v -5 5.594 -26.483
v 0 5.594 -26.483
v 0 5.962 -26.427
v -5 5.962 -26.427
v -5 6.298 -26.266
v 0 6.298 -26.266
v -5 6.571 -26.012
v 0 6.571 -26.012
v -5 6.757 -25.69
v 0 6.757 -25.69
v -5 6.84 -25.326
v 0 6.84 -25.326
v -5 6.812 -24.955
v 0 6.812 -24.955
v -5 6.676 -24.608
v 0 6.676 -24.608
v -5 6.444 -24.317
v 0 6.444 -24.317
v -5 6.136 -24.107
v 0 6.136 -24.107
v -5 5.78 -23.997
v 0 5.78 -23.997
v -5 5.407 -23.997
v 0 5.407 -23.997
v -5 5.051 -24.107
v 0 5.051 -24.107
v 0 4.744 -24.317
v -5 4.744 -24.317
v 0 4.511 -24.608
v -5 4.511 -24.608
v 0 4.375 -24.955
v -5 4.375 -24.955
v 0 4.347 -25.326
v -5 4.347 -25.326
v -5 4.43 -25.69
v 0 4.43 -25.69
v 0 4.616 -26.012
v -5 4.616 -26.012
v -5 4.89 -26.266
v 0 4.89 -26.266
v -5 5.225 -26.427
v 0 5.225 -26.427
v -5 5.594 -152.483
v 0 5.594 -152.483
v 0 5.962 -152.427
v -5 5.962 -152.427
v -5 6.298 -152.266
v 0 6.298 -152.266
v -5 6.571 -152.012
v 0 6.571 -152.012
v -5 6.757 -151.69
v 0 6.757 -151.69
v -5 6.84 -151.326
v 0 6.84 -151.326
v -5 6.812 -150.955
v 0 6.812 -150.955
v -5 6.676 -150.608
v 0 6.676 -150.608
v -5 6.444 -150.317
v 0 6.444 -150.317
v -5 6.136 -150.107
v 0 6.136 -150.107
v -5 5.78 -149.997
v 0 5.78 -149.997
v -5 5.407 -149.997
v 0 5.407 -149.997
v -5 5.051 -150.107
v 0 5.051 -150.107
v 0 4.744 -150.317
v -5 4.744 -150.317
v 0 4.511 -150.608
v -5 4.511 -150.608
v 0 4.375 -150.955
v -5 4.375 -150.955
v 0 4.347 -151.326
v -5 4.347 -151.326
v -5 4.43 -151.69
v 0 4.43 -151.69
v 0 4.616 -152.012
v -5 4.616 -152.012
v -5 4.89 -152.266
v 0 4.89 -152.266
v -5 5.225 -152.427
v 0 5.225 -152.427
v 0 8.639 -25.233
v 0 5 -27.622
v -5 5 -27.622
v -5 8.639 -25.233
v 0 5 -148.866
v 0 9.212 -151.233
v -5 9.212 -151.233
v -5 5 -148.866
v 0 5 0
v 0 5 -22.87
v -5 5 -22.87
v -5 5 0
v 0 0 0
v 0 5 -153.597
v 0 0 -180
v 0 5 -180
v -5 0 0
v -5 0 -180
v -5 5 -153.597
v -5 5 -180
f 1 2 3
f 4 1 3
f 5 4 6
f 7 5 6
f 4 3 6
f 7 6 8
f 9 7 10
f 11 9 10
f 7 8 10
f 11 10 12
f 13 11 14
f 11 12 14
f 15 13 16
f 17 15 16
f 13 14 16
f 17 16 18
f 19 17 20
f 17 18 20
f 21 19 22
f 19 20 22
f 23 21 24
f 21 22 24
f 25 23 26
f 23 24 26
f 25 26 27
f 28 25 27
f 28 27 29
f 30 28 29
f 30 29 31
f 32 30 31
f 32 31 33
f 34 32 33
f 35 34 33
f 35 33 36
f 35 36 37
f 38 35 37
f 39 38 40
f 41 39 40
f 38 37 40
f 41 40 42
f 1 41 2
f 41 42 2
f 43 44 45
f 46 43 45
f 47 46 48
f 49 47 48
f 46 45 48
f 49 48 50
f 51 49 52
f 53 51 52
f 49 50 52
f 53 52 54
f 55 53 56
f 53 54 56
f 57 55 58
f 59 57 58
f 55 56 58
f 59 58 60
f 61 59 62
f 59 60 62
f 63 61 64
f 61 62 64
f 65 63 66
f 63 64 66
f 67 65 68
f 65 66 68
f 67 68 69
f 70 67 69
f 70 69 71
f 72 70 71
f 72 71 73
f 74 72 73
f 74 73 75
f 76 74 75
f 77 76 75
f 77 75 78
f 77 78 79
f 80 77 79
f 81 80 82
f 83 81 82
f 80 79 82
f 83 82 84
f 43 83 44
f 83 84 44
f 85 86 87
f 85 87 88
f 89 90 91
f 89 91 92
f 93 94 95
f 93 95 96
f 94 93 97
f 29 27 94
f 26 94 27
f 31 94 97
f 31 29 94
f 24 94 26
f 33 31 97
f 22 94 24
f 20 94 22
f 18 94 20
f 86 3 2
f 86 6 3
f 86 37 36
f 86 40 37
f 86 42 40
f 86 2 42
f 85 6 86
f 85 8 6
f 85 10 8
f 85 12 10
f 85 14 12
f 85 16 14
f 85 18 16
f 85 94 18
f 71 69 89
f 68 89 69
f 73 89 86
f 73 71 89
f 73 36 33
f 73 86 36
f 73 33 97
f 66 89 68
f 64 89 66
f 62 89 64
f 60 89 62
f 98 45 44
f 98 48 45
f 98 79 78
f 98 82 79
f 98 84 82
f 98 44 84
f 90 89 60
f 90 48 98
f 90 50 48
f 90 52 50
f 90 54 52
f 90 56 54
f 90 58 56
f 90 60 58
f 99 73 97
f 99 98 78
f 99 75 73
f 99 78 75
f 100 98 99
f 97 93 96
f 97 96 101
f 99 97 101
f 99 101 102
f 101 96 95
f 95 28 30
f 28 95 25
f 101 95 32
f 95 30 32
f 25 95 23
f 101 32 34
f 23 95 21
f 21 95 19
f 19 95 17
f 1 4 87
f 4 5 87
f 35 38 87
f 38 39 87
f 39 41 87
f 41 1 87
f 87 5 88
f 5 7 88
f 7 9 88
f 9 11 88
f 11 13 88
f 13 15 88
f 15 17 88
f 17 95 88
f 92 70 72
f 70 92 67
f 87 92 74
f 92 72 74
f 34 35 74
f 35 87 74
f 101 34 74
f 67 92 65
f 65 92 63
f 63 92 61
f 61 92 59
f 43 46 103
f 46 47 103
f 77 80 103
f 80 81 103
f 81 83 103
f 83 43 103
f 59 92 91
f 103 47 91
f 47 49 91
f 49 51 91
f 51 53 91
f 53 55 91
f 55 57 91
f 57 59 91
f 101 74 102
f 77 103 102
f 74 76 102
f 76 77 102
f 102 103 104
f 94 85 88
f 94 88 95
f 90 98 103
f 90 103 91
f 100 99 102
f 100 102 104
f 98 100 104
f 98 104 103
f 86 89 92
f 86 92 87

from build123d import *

# Parameters (mm, degrees)
SKETCH1_R           = 1.25
BOSS_EXTRUDE1_DEPTH = 5


with BuildPart() as part:
    # Sketch1 → Boss-Extrude1 (new body)
    with BuildSketch(Plane(origin=(0, 0, 0), x_dir=(0, 0, -1), z_dir=(1, 0, 0))):
        Polygon((25.233, 8.638537032), (22.869893181, 5), (0, 5), (0, 0), (180, 0), (180, 5), (153.59702619, 5), (151.233, 9.21189857), (148.866471386, 5), (27.622231329, 5), align=None)
        with Locations((25.233, 5.593756264)):
            Circle(SKETCH1_R, mode=Mode.SUBTRACT)
        with Locations((151.233, 5.593756264)):
            Circle(SKETCH1_R, mode=Mode.SUBTRACT)
    extrude(amount=-BOSS_EXTRUDE1_DEPTH)


solid = part.part
